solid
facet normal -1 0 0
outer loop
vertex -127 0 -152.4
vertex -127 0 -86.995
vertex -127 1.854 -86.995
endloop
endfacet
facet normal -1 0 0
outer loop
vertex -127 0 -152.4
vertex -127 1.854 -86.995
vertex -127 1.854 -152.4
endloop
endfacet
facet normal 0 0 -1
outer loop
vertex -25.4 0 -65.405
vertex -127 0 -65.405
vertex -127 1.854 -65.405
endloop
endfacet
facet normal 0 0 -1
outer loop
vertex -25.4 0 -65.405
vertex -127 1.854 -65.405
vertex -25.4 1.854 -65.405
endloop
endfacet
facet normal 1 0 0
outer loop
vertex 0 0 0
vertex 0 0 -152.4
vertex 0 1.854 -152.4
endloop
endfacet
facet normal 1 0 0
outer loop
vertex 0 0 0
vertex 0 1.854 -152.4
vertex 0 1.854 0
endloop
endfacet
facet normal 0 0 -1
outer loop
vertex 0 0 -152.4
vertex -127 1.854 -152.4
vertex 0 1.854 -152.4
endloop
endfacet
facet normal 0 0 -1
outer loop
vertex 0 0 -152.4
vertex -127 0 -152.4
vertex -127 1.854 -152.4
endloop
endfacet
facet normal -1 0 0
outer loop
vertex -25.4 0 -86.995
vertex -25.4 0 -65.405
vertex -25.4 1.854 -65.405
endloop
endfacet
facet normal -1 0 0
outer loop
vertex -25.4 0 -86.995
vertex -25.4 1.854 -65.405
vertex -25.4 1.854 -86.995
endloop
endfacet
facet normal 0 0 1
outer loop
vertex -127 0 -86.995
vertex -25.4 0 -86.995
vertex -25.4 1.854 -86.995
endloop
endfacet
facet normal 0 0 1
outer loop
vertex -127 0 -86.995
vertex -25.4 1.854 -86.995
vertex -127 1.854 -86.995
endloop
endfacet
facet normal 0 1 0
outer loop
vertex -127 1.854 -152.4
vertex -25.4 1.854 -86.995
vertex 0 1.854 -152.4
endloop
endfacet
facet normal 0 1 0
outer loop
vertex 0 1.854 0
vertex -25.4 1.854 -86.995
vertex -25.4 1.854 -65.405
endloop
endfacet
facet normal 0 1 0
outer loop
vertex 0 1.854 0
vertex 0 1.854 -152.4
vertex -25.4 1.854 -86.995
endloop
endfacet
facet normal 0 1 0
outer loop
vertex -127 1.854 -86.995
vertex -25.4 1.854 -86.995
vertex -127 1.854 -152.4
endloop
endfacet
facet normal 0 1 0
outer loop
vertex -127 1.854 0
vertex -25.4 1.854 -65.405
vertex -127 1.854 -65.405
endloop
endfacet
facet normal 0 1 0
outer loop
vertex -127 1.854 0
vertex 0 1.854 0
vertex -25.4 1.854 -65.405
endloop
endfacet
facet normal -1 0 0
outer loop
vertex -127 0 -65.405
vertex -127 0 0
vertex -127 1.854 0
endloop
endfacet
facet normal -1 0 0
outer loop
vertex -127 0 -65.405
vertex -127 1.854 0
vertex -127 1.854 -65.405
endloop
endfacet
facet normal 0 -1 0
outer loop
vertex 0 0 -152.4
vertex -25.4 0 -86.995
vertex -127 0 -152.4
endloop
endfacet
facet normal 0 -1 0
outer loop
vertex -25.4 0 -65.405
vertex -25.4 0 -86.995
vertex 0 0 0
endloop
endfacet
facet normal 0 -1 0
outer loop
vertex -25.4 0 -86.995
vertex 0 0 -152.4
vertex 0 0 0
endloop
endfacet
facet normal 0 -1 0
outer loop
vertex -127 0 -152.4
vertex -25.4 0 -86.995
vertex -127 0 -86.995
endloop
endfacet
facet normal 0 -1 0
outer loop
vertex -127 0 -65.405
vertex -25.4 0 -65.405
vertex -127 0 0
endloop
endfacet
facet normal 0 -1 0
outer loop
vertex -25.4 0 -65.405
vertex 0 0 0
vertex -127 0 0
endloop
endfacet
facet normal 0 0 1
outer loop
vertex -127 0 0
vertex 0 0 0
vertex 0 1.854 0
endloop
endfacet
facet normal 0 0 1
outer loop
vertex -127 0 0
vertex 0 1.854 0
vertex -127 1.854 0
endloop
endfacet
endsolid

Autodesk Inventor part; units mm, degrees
ref_plane "YZ Plane" through (0, 0, 0) normal (1, 0, 0) x (0, 1, 0)
ref_plane "XZ Plane" through (0, 0, 0) normal (0, 1, 0) x (-1, 0, 0)
ref_plane "XY Plane" through (0, 0, 0) normal (0, 0, 1) x (1, 0, 0)
sketch "Sketch1" plane through (0, 0, 0) normal (0, 1, 0) x (-1, 0, 0)
  line L0 (0, 0) -> (127, 0)
  line L1 (127, 0) -> (127, -152.4)
  line L2 (127, -152.4) -> (0, -152.4)
  line L3 (0, -152.4) -> (0, 0)
  line L4 (127, -65.405) -> (25.4, -65.405)
  line L5 (25.4, -65.405) -> (25.4, -86.995)
  line L6 (25.4, -86.995) -> (127, -86.995)
  line L7 (127, -86.995) -> (127, -65.405)
  dimension "d0" = 152.4
  dimension "d1" = 127
  dimension "d2" = 21.59
  dimension "d3" = 65.405
  dimension "d4" = 101.6
extrude "Extrusion1" add sketch "Sketch1" along normal blind 1.8542 contours L0 L1 L4 L5 L6 L2 L3
equation "\"d3\" = -0.5 * d2 + 0.5 * d0"
properties part number "paddle collection ramp"
